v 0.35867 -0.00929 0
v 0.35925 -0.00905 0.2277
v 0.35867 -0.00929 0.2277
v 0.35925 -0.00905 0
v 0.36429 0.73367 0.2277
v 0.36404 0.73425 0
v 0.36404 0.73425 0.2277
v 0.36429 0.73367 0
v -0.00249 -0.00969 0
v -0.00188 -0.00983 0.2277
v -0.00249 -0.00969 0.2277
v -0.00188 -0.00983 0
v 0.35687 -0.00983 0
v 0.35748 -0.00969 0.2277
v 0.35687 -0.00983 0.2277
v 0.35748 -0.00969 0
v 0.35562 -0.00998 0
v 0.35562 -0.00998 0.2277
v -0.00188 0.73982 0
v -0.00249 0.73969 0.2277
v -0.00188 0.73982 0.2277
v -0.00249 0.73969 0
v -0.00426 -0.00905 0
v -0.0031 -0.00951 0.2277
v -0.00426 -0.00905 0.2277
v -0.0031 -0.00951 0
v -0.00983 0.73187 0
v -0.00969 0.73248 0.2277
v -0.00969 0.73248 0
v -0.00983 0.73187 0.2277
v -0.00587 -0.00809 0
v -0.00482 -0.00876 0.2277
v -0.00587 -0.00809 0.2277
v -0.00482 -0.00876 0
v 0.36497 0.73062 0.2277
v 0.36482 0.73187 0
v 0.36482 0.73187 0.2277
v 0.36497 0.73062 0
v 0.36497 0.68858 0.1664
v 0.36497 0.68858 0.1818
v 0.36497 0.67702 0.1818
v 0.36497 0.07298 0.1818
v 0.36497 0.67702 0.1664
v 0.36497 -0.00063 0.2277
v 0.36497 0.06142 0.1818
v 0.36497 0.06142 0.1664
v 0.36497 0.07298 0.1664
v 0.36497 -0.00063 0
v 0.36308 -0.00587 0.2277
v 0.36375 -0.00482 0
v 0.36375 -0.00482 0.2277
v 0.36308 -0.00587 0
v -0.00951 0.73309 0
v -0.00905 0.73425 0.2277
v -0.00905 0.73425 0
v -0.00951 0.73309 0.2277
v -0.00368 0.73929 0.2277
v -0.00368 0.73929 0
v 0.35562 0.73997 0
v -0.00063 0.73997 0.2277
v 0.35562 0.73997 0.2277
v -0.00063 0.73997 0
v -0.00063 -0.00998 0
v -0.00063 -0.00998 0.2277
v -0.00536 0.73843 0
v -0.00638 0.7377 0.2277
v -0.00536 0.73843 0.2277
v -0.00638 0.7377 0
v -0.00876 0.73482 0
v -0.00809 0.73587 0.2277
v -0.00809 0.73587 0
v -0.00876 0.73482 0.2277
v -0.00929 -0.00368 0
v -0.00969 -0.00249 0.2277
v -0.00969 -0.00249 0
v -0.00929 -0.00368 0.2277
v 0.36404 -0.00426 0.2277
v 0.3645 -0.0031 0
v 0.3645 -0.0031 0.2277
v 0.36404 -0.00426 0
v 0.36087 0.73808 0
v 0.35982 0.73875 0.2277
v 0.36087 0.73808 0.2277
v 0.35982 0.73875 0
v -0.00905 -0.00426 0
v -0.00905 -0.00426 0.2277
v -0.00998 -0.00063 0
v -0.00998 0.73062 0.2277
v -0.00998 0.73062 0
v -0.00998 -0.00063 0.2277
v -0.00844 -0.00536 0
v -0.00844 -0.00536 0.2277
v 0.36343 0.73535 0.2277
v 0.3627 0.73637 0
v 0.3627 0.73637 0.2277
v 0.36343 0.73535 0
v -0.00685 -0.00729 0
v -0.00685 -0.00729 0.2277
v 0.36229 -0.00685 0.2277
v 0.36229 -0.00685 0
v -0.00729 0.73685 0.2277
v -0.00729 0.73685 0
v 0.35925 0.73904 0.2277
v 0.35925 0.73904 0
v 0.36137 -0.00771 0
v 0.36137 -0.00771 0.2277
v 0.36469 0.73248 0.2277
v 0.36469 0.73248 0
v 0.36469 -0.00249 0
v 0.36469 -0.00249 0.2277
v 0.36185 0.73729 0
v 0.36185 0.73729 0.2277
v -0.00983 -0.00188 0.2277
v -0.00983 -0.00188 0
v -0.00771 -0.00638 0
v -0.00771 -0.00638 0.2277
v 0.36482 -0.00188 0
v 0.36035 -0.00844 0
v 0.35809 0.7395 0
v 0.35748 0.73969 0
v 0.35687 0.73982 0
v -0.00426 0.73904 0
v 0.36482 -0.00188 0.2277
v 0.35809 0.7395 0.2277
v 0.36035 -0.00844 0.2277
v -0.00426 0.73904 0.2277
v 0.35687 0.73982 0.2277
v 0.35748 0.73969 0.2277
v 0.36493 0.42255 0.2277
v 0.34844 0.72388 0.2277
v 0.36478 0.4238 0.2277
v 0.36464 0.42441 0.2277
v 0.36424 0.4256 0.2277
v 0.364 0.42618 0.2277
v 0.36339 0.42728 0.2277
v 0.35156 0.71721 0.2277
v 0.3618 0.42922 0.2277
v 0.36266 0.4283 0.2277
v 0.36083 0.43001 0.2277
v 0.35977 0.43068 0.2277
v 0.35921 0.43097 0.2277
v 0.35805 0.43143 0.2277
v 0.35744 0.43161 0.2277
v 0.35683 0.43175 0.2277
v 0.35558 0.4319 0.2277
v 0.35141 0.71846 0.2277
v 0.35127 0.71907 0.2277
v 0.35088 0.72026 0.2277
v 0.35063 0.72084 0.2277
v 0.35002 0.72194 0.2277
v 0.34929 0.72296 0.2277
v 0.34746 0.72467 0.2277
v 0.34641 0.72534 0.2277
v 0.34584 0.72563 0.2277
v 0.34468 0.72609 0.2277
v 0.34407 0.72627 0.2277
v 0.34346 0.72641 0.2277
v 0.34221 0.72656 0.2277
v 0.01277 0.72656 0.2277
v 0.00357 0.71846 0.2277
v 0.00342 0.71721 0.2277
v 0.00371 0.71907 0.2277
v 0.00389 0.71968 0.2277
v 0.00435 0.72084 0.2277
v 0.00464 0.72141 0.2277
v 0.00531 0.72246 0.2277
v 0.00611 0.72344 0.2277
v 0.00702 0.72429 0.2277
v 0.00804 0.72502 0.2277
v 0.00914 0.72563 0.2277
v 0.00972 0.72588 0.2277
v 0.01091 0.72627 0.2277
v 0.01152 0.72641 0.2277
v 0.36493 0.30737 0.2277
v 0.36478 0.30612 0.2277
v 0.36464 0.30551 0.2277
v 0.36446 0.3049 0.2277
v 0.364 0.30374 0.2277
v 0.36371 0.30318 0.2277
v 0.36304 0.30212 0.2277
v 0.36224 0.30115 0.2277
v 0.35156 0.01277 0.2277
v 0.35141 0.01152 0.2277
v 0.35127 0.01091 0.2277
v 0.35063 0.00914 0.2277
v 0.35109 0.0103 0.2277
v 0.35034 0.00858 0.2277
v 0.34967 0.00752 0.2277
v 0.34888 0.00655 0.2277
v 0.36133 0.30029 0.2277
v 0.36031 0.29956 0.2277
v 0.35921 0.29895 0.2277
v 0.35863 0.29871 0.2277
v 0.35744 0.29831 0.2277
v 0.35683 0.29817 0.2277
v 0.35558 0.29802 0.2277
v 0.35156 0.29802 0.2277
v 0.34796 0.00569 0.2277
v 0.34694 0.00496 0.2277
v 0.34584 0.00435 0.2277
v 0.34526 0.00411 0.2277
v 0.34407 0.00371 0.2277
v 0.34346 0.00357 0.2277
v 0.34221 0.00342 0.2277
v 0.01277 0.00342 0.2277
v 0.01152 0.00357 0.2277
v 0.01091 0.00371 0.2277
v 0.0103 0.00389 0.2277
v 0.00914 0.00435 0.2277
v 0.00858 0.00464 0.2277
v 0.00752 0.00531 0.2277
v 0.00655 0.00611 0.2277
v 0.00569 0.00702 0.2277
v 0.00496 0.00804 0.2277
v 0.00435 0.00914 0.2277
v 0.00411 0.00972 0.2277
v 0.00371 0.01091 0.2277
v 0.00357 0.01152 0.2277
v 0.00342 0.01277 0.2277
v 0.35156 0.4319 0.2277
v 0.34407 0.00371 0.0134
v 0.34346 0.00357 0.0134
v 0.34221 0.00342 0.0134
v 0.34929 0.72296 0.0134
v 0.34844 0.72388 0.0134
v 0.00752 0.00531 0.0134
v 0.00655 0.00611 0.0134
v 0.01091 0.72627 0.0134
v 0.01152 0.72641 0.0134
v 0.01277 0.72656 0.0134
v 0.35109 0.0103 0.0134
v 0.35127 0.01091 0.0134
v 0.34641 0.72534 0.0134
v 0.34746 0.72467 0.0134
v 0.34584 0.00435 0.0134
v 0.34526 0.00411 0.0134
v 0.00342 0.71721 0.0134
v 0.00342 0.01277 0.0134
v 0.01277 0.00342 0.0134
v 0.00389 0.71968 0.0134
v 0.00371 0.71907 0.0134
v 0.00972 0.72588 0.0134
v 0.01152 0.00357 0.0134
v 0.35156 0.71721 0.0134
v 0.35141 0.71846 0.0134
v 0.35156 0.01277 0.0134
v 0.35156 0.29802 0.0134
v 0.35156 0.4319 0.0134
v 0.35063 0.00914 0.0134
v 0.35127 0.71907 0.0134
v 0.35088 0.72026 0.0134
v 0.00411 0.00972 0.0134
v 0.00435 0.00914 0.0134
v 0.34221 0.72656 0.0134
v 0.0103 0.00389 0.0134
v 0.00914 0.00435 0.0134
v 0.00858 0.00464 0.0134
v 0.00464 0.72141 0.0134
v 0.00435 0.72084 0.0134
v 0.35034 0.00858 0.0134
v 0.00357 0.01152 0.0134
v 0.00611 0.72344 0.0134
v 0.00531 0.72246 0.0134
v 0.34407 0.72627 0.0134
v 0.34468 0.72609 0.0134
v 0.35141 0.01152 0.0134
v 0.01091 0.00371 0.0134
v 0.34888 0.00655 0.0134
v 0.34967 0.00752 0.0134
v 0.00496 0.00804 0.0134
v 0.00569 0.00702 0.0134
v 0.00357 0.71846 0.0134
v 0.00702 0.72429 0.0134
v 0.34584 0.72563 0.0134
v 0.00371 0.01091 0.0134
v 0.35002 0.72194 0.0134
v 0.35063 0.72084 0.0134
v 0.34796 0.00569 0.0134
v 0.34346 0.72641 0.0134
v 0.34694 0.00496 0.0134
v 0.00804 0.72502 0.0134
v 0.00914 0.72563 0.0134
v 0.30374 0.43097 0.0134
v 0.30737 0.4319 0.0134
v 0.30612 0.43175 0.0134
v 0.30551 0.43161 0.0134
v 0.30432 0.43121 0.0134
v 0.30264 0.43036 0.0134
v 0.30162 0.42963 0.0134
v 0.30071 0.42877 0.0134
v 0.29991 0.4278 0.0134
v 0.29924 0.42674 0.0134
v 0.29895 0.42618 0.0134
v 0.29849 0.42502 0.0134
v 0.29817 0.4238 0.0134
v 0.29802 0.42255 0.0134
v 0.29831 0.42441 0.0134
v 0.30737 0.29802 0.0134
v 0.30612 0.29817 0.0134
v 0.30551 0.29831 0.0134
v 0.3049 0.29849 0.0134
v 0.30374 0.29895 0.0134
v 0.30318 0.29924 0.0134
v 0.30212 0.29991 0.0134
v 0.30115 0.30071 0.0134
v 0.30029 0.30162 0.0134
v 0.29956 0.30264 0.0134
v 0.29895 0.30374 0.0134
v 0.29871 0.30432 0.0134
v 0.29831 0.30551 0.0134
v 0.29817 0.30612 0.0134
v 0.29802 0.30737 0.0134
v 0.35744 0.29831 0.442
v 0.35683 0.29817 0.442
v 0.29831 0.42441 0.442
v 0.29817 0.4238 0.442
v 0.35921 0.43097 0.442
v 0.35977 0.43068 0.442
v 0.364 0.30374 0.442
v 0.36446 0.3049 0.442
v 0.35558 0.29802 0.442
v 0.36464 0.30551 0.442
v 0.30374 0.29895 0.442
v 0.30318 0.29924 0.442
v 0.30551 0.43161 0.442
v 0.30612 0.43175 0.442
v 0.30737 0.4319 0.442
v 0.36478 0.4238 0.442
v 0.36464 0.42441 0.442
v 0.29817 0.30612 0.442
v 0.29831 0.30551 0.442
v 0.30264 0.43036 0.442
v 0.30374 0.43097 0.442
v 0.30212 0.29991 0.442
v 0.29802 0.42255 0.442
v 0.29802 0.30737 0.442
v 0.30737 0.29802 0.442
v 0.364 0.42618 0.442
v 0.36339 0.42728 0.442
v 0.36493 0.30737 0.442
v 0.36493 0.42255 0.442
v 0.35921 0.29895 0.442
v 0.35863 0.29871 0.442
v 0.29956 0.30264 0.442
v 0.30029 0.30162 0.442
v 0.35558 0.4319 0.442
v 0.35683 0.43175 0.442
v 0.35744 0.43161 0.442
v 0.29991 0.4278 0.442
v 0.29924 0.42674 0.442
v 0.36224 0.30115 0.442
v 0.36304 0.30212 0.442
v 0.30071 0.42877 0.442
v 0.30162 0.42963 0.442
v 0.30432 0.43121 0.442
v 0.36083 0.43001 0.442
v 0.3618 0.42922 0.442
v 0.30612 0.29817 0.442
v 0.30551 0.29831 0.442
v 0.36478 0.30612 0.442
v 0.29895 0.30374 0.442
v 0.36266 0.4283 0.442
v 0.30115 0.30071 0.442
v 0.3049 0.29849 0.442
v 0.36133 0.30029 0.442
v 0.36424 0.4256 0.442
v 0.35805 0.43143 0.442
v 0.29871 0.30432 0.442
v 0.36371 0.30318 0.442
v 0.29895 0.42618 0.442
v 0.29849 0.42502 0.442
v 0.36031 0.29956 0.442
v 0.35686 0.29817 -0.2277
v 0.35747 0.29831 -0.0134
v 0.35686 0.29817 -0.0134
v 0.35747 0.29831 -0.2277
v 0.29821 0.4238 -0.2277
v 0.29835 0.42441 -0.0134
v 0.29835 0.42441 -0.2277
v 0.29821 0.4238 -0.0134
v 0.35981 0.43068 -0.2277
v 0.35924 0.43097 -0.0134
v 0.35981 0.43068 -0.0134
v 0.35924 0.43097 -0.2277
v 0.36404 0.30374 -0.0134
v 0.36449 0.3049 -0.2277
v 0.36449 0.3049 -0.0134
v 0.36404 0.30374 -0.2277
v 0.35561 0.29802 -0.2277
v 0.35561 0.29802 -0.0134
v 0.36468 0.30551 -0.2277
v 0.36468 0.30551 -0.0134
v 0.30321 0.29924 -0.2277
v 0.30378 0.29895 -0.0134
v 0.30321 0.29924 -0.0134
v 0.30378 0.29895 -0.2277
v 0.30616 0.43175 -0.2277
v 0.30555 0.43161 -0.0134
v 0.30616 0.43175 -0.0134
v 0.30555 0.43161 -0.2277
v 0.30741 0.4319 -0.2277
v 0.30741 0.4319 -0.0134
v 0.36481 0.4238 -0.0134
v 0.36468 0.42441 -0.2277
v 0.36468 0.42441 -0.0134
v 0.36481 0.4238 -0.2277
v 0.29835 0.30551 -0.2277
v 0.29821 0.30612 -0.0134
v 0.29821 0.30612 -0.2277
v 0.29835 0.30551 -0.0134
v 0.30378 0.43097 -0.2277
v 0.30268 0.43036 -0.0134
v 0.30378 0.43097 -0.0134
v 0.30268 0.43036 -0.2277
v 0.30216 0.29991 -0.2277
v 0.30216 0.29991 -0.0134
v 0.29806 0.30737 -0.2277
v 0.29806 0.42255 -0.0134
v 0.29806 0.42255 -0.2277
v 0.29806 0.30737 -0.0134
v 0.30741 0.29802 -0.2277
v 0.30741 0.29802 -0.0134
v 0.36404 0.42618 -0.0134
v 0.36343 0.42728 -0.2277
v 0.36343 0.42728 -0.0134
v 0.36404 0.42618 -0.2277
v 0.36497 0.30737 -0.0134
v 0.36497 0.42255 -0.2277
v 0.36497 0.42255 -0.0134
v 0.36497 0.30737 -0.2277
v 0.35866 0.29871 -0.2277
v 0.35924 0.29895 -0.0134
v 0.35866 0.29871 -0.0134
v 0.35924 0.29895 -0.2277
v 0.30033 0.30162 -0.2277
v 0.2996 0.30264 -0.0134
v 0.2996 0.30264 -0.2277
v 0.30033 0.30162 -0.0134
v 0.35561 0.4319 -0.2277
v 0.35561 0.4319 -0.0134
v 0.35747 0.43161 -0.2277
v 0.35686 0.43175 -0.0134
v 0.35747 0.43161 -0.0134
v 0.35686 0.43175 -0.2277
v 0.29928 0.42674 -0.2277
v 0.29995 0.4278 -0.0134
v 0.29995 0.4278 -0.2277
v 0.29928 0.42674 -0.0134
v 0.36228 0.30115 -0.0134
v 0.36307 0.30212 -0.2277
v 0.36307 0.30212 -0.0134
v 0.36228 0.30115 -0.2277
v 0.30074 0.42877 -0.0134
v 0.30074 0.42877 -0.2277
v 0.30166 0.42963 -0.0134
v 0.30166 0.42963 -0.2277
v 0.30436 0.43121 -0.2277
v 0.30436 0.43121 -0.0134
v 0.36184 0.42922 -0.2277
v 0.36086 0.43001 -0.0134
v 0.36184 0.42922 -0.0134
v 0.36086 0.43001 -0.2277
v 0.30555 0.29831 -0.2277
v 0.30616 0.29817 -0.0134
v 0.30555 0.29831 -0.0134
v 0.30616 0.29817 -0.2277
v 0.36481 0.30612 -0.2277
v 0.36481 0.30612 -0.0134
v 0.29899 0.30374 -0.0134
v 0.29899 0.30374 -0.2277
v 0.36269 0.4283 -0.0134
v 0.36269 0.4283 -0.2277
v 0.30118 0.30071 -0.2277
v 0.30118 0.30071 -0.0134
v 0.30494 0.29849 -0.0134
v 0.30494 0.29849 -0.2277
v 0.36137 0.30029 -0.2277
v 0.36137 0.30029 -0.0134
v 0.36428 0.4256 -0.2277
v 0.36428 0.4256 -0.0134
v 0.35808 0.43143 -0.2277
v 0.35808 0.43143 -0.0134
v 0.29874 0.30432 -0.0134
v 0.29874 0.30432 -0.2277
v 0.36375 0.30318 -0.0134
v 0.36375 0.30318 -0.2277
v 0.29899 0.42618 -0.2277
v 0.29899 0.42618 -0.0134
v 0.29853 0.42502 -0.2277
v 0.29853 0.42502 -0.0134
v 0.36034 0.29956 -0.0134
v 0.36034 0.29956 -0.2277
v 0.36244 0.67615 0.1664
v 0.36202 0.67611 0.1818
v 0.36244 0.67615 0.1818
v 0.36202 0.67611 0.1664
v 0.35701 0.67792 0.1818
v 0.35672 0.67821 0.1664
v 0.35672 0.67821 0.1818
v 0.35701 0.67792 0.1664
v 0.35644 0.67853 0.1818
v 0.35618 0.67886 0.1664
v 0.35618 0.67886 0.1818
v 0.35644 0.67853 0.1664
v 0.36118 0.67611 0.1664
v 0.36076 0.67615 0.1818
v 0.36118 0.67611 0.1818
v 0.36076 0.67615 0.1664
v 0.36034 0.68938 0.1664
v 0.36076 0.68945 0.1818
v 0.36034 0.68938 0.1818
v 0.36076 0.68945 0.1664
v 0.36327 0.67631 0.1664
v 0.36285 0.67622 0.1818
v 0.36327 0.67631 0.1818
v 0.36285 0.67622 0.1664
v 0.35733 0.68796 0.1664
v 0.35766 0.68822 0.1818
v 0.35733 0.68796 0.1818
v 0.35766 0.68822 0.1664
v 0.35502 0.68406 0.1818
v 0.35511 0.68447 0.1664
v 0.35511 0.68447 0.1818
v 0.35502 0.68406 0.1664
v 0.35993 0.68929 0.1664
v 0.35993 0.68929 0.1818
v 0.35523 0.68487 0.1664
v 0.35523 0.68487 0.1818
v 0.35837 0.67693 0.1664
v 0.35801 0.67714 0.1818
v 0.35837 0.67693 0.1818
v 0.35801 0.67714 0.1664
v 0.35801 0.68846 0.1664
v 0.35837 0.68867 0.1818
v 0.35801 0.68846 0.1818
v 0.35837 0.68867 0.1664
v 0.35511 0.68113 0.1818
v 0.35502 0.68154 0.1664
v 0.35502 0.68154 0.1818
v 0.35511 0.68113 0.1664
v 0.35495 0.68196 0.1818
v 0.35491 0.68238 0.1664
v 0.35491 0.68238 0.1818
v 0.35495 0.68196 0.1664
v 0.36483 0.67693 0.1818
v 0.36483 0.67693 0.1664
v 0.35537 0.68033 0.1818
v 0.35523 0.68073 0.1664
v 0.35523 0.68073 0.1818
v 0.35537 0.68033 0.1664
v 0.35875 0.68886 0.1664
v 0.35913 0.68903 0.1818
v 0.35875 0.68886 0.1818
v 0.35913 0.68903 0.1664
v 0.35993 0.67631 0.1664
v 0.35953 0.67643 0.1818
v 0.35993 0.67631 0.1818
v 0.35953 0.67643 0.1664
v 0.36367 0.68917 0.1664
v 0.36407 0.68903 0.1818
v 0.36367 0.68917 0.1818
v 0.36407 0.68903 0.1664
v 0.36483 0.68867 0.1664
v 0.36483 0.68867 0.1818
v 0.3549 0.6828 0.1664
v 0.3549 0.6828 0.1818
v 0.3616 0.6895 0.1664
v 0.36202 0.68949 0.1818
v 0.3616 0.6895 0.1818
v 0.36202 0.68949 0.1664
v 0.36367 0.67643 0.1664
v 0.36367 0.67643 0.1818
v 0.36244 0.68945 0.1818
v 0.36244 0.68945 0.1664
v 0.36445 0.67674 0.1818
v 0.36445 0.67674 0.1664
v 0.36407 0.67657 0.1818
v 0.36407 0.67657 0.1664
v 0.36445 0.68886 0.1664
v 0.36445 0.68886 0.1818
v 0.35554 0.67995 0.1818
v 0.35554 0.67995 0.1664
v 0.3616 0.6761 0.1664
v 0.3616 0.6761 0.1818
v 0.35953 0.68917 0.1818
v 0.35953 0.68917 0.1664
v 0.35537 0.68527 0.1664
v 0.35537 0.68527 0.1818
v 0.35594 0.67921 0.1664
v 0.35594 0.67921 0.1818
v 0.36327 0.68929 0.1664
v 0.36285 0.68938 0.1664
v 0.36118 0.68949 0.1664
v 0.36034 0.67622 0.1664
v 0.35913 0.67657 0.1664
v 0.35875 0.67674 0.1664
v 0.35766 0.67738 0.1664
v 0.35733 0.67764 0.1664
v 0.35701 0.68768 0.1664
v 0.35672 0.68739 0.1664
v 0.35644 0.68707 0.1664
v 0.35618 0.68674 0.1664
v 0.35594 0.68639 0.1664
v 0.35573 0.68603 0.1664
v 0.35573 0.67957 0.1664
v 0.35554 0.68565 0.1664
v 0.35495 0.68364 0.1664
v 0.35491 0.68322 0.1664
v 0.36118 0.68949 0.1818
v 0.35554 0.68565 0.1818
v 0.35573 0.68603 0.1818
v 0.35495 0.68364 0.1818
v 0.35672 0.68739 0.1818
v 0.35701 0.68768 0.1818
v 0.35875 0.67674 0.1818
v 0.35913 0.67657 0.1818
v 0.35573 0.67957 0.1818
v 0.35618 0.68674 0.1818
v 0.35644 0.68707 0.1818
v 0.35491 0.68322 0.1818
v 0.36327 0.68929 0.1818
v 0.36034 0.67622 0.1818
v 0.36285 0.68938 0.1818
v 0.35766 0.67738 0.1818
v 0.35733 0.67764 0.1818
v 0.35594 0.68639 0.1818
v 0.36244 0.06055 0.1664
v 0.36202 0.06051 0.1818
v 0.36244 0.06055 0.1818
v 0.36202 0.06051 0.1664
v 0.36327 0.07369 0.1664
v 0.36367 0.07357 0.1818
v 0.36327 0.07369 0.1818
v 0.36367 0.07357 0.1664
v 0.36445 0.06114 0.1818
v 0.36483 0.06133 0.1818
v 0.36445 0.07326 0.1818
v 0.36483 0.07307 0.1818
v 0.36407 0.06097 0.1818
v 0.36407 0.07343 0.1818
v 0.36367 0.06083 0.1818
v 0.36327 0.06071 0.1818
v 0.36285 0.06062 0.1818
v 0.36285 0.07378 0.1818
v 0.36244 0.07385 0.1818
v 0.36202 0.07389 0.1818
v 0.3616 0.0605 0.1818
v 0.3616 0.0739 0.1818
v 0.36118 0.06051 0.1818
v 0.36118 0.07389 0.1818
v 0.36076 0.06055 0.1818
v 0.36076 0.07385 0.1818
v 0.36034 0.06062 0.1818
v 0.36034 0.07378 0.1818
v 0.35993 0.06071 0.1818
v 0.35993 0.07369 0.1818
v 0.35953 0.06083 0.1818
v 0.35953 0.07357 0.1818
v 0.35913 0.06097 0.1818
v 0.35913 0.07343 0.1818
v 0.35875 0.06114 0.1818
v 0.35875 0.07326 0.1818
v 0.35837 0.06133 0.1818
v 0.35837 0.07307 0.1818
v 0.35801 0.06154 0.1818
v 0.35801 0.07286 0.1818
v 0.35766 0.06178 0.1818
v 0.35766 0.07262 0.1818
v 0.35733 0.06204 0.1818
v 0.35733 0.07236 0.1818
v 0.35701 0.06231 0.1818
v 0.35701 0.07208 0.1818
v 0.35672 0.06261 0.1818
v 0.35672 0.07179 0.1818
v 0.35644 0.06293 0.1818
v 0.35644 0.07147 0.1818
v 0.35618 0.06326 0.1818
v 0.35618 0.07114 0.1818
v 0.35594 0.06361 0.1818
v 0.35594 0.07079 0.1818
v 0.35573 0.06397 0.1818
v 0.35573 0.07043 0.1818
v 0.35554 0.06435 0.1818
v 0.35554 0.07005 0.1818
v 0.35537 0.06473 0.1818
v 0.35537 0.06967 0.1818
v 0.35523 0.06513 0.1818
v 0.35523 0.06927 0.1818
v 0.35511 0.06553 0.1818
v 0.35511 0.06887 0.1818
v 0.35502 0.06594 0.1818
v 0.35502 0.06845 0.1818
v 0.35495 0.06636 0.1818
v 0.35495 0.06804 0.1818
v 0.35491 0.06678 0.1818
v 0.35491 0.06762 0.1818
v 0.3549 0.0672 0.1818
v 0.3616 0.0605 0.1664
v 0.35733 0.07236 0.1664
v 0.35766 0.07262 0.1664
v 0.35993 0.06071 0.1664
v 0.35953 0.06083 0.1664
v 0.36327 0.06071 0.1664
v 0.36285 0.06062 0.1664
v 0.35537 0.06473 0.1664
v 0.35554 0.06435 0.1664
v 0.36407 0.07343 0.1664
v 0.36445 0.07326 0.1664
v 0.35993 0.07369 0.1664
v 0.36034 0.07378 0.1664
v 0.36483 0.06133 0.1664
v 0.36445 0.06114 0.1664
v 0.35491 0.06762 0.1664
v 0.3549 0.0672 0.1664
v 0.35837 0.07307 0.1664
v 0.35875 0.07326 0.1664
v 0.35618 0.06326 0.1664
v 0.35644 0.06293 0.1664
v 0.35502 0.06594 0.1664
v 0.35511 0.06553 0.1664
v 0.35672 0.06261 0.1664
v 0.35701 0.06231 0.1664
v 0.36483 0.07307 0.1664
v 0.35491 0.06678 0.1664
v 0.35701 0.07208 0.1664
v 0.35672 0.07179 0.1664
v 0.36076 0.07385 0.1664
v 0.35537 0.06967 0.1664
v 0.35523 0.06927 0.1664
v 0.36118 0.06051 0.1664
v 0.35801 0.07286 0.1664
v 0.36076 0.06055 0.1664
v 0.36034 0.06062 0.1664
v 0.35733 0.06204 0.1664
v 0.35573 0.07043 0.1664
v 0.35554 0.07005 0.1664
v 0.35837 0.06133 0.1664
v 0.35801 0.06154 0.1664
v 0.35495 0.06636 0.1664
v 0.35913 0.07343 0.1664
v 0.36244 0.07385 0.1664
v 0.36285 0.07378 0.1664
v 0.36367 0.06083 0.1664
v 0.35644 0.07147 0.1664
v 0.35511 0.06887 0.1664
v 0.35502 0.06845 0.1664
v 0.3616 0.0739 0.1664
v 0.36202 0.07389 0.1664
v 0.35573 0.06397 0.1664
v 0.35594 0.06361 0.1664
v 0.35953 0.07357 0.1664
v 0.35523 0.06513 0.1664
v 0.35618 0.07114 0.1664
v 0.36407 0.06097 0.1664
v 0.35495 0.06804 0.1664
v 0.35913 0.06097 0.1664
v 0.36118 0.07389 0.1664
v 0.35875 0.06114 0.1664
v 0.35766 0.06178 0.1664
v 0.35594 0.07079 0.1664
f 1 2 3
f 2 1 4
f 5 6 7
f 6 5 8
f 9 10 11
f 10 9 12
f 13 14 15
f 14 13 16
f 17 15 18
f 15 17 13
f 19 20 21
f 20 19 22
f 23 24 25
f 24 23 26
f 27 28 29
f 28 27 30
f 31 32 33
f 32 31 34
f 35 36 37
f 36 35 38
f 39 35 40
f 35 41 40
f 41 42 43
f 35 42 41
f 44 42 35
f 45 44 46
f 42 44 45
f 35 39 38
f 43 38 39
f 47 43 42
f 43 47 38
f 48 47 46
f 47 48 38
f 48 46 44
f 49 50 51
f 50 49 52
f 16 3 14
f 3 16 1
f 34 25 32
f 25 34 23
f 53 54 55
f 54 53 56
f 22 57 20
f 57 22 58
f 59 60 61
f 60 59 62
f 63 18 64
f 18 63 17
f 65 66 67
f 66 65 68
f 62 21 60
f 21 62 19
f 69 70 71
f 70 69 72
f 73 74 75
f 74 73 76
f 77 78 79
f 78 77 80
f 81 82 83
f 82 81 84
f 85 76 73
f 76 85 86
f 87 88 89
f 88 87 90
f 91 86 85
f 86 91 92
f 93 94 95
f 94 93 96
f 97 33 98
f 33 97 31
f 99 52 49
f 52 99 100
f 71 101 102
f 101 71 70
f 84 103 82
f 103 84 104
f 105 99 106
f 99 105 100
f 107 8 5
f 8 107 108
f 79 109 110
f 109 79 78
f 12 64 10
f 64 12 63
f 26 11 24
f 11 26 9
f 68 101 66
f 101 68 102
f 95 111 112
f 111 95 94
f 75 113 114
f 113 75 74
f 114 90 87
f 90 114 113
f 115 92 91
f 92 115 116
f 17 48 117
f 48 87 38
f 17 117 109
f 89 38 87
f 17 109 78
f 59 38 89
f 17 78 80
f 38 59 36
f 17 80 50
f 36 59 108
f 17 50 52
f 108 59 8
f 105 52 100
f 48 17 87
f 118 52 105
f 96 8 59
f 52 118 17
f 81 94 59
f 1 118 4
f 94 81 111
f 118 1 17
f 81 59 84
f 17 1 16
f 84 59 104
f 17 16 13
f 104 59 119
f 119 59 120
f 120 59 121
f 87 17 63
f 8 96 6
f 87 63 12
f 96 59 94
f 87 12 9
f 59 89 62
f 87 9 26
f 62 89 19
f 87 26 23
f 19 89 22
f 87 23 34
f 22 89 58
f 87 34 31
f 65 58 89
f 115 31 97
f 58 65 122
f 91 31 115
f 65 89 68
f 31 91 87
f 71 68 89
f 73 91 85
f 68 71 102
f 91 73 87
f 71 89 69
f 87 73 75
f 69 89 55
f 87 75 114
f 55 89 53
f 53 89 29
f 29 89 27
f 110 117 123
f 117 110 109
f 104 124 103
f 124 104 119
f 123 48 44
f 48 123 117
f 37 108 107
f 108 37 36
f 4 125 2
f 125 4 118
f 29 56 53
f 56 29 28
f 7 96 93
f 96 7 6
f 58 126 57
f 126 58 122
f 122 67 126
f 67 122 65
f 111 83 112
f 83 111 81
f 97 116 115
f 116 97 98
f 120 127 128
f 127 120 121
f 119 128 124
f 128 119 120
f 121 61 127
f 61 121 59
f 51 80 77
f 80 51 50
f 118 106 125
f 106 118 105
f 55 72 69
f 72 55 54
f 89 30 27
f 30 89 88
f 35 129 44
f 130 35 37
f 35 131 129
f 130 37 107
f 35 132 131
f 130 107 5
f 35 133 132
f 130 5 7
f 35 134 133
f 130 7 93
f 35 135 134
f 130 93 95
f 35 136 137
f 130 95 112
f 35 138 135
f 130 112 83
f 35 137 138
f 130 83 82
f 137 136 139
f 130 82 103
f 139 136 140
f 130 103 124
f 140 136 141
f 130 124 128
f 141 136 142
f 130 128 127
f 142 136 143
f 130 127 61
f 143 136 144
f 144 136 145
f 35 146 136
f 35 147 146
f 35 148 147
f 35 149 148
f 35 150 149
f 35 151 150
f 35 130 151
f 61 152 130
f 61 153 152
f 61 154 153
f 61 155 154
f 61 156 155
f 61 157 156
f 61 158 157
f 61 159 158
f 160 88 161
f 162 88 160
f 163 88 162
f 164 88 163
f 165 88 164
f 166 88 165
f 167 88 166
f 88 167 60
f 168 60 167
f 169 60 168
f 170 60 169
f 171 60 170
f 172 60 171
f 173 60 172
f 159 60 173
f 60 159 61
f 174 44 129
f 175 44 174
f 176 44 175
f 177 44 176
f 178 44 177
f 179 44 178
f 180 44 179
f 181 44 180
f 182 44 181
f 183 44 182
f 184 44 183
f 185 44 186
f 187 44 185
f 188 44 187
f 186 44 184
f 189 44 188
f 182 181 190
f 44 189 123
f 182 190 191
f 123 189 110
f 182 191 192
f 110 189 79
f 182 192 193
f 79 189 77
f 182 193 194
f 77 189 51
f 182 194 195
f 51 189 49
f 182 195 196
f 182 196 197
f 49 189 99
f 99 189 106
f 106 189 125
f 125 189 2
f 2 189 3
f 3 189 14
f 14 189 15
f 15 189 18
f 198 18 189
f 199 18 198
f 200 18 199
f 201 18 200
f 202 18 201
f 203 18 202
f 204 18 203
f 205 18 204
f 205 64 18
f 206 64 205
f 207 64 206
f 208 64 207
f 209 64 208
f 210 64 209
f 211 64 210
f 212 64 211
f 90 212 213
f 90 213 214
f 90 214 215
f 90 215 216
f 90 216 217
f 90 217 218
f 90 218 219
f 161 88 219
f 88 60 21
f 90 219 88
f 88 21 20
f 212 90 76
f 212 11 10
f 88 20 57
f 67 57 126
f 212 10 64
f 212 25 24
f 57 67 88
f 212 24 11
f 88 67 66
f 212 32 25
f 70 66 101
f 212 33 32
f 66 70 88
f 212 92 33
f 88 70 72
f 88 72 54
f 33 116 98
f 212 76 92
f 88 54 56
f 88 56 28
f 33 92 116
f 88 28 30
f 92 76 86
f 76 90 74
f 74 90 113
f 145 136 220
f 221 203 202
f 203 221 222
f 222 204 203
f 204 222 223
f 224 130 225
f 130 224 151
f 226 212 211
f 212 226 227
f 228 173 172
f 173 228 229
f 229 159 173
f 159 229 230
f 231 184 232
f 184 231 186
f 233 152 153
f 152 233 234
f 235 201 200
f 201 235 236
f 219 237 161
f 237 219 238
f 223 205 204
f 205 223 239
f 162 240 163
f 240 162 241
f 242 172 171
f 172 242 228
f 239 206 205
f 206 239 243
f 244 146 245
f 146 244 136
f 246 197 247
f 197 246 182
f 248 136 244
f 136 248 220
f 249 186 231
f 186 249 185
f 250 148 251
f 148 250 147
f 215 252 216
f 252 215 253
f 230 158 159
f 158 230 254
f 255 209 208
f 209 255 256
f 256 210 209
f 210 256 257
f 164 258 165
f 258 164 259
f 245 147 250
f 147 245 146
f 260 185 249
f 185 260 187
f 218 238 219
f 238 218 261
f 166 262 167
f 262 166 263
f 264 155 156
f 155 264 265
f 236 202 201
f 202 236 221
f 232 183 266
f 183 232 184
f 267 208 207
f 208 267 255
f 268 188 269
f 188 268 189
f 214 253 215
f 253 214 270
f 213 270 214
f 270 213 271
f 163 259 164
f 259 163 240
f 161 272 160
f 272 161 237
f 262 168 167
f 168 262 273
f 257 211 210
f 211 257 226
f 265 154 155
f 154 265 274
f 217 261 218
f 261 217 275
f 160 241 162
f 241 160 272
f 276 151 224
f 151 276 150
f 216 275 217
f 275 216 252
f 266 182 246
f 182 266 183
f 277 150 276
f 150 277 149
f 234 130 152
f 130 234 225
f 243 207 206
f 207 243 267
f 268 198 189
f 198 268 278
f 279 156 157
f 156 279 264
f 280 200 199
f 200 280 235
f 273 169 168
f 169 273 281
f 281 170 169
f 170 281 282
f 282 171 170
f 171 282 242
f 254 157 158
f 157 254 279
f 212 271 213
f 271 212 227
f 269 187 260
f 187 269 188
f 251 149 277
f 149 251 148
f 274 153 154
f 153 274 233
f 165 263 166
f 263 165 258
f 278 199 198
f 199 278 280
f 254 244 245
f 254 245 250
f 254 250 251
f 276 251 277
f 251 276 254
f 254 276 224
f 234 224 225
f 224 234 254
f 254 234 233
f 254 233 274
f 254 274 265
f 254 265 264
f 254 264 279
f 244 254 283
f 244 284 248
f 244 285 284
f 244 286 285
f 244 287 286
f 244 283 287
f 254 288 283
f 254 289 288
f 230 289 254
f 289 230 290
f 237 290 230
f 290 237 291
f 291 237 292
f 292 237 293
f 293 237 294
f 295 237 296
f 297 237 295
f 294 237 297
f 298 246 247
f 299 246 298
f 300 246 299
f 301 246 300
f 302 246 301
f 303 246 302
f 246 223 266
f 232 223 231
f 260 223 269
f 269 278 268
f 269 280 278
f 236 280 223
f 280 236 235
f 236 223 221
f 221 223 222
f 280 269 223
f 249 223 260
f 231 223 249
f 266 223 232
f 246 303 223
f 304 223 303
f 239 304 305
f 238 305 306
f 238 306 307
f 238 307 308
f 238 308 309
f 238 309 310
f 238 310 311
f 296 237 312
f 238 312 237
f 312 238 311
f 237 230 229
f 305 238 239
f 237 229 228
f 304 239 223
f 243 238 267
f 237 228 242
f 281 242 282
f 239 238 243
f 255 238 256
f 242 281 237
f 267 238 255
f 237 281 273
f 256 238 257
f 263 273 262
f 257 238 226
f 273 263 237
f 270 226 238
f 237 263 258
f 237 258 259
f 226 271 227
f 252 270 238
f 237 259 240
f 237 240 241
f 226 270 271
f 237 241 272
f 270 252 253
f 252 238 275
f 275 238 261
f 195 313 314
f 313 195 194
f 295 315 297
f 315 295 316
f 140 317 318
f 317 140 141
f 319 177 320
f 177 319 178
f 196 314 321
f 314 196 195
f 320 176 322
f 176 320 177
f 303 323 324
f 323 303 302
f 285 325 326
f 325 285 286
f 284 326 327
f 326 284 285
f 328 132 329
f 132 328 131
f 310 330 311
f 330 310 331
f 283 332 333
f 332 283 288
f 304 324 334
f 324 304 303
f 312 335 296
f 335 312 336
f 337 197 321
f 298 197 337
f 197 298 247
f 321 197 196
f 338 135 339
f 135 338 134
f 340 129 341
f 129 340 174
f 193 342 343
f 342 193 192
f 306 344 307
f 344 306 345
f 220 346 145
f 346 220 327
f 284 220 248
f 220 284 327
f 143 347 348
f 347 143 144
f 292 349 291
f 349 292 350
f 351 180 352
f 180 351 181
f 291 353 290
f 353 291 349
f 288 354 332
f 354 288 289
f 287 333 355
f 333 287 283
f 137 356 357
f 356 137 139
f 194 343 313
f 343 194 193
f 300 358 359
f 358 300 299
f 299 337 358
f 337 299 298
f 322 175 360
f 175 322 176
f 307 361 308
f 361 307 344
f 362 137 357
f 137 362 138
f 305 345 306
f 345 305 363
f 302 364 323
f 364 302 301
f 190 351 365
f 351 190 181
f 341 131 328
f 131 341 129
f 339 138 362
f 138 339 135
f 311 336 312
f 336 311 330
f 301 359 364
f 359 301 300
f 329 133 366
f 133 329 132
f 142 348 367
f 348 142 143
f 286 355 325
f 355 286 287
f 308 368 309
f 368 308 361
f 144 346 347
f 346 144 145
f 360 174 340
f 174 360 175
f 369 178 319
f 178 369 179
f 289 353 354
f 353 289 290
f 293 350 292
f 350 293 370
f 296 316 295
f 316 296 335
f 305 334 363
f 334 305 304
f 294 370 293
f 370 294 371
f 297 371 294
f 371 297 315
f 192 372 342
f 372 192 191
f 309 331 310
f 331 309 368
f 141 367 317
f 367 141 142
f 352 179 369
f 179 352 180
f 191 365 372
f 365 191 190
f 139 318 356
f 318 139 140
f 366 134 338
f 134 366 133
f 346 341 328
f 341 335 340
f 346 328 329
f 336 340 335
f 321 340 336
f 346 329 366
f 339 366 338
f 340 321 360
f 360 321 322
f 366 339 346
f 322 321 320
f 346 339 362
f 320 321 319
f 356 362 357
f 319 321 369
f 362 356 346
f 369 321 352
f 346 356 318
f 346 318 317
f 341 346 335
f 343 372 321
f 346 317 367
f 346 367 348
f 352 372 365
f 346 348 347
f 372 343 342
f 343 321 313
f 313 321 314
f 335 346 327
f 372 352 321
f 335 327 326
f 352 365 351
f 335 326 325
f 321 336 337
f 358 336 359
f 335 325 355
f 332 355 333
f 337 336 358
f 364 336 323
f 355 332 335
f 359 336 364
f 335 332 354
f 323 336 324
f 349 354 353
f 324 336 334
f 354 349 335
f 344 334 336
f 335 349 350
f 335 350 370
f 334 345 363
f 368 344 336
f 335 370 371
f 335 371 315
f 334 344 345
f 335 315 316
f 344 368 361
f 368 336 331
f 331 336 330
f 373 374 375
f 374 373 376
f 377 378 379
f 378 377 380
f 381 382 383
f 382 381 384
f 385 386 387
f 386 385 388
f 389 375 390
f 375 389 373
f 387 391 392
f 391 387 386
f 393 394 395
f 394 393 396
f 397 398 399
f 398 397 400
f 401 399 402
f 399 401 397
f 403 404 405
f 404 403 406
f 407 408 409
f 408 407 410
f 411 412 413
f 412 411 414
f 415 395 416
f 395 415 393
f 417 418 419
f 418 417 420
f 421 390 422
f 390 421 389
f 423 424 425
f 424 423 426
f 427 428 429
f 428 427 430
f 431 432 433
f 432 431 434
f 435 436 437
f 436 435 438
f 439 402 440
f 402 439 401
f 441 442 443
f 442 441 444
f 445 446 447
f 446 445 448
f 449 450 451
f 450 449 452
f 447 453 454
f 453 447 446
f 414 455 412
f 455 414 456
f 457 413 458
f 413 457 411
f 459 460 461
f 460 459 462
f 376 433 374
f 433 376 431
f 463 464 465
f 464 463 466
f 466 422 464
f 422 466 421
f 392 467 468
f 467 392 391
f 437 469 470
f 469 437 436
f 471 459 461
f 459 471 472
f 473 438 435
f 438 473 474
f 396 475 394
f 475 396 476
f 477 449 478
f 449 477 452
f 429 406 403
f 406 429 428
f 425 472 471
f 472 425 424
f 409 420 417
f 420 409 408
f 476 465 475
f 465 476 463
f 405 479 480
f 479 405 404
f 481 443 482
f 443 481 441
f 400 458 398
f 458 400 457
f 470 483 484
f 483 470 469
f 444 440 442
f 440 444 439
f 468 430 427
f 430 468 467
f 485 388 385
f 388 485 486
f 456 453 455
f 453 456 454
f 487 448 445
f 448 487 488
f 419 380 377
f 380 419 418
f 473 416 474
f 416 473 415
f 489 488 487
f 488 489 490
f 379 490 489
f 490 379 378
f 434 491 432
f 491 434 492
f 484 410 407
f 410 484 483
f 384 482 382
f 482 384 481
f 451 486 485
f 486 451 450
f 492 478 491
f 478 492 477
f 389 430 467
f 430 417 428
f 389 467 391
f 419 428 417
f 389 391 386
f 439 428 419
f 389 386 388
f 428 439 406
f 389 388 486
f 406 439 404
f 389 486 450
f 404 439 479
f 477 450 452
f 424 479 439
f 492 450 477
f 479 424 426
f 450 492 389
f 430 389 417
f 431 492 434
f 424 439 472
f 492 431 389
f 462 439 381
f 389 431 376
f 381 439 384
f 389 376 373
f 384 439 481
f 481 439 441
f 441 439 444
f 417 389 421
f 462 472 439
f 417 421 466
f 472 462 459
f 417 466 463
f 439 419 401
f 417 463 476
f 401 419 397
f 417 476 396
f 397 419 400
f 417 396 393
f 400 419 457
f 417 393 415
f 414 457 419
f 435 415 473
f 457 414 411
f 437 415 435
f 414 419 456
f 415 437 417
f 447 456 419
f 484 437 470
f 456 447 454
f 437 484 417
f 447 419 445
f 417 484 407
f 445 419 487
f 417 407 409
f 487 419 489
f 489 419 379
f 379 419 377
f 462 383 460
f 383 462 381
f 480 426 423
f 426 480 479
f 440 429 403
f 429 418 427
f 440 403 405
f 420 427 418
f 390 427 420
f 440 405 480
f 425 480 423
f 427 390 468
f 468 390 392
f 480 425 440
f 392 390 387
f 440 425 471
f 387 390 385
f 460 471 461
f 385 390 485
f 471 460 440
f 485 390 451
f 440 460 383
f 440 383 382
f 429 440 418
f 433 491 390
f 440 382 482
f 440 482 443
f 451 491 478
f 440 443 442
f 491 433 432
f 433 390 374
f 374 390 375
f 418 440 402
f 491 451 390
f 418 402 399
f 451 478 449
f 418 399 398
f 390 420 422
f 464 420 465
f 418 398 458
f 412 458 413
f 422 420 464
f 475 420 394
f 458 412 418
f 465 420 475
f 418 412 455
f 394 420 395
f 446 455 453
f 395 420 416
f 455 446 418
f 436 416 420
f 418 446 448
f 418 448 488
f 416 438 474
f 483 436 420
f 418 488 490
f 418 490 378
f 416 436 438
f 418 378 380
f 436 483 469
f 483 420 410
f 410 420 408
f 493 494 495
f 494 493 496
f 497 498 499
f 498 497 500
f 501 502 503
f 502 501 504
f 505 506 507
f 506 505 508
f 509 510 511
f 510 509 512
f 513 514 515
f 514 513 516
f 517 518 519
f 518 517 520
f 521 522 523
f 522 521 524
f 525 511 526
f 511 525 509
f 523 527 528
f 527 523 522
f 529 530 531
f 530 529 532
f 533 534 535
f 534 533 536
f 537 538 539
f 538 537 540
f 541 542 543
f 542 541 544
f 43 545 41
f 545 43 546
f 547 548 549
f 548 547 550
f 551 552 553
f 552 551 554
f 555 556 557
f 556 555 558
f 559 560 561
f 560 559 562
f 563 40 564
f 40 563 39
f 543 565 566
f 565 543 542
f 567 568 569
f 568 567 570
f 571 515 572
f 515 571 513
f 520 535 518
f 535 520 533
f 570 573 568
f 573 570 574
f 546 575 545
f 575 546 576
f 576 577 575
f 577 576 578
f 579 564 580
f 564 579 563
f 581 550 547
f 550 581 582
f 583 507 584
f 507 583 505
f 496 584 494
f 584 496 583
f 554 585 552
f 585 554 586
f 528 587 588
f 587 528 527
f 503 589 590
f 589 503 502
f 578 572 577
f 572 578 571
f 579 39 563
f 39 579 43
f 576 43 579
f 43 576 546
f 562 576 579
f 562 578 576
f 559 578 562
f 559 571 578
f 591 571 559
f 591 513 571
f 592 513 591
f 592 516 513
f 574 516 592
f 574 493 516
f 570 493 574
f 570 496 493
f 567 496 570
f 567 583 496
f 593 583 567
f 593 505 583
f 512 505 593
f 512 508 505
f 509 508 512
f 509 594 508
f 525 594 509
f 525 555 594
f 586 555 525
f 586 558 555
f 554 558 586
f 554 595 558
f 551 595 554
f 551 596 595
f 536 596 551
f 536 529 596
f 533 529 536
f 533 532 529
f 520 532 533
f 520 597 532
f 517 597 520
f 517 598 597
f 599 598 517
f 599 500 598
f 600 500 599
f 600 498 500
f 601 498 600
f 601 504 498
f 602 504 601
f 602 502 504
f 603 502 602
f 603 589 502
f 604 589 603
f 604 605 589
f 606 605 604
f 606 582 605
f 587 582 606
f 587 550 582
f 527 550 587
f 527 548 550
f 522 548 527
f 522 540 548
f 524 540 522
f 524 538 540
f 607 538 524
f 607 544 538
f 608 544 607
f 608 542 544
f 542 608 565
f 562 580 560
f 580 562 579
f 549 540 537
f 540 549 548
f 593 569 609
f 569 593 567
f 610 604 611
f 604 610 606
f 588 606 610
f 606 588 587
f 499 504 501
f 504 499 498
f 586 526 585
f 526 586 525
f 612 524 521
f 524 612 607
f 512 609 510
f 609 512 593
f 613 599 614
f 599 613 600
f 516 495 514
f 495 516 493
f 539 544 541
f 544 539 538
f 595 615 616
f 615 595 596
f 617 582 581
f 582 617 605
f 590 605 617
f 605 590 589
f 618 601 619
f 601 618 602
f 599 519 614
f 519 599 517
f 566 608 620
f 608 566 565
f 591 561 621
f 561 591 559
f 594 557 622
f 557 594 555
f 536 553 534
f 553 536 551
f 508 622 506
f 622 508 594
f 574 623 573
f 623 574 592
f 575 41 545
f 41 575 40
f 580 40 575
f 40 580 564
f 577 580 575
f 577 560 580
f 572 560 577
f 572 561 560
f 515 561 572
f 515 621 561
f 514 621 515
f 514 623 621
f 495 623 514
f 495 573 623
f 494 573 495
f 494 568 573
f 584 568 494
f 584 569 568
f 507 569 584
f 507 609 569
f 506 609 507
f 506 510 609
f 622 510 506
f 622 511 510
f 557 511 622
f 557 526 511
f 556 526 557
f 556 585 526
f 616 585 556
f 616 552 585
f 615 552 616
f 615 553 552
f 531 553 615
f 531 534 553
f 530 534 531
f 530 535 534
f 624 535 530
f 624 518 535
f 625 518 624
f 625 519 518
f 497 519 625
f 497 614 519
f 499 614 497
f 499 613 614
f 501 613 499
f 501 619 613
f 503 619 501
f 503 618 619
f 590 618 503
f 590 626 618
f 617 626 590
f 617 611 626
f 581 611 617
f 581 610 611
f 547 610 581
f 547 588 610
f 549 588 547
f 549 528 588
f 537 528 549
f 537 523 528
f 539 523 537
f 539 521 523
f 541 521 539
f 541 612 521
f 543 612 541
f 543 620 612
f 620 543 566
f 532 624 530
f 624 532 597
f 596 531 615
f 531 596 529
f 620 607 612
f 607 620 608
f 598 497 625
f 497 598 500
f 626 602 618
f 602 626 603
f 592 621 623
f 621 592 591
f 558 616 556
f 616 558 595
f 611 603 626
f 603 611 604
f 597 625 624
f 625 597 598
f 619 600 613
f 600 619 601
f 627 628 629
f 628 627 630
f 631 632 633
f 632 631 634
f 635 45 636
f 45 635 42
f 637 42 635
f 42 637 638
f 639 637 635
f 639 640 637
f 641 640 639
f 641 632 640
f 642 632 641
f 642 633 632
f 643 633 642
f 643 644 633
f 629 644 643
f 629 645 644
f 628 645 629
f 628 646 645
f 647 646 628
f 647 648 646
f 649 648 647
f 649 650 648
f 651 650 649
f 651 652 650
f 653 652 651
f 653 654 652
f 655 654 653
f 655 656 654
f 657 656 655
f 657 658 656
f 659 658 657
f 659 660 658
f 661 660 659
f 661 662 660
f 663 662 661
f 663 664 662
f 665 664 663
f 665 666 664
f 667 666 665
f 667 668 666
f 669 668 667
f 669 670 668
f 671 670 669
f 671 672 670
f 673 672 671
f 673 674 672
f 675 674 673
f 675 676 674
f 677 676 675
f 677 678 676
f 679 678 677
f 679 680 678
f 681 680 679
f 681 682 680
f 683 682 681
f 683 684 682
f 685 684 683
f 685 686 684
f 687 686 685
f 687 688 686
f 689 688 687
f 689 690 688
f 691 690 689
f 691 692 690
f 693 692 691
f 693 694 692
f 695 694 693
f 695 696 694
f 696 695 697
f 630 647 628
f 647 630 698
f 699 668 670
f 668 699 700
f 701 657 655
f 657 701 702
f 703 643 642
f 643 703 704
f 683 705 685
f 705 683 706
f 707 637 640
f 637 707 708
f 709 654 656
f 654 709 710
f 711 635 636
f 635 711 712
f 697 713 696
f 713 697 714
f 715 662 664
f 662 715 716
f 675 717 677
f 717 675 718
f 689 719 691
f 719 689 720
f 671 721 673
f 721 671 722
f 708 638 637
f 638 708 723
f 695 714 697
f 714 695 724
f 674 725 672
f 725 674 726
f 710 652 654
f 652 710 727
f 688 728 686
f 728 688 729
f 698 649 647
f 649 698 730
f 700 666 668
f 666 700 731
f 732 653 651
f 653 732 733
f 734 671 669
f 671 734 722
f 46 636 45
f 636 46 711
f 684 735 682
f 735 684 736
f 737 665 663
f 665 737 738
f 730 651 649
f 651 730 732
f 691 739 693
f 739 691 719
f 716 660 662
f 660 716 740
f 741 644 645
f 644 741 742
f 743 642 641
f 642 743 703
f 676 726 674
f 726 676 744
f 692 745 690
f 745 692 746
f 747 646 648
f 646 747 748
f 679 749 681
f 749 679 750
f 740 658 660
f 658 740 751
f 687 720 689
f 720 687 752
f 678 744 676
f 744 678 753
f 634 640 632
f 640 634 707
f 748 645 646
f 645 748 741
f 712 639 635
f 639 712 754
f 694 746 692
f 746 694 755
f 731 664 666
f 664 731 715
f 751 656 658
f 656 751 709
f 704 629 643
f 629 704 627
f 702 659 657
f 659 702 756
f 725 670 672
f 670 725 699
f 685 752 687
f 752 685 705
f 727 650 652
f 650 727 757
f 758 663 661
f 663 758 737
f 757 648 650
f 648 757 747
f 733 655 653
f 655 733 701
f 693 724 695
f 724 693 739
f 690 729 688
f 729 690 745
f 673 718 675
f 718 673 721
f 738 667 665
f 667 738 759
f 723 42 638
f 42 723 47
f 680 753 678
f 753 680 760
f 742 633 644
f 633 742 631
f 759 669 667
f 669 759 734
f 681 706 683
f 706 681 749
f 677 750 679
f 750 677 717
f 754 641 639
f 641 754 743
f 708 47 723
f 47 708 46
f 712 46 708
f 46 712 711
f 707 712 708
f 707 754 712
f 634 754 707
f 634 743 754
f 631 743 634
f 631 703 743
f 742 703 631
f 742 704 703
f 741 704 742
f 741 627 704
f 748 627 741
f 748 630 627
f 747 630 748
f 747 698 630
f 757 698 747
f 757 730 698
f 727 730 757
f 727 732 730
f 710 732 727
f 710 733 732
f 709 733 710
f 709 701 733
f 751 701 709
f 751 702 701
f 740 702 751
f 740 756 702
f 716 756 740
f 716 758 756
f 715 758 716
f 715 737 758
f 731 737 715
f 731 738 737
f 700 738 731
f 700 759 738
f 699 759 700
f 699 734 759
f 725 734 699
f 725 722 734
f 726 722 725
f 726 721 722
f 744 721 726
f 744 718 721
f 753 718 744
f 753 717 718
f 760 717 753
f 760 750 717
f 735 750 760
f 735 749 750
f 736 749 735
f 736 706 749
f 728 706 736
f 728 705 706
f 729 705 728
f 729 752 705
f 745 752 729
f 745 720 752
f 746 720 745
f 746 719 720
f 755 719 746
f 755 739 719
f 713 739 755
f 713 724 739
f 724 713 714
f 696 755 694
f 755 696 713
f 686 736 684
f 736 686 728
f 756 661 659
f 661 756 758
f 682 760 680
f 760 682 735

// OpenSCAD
// Parameters
base_length = 0.375;
base_width = 0.75;
base_height = 0.013393;
base_reach = 0.0134;

wall_reach = 0.2277;
wall_thickness = 0.0134;

sleeve_length = 0.066964;
sleeve_width = 0.133929;
sleeve_height = 0.214286;
sleeve_extrusion = 0.2143;
sleeve_total_reach = 0.442;
sleeve_offset_left = 0.308;
sleeve_offset_front = 0.308;
sleeve_offset_back = 0.3081;

lower_depth = 0.2143;
lower_top_below_base = 0.0134;
lower_bottom_below_base = 0.2277;

hole_radius = 0.0067;
hole_x = 0.3616;
hole1_y = 0.6828;
hole2_y = 0.0672;
hole_z_start = 0.1674;
hole_z_end = 0.1808;
hole_cut_depth = 0.0134;

corner_r = 0.01;
$fn = 100;

// Rounded rectangle module
module rounded_rect(l, w, h) {
    linear_extrude(height = h)
        offset(r = corner_r)
            square([l - 2*corner_r, w - 2*corner_r], center = false);
}

// Main assembly
difference() {
    union() {
        // Base plate: 0.375 x 0.75, reach 0.0134 from datum
        color("SteelBlue")
            rounded_rect(base_length, base_width, base_reach);

        // Wall frame: same footprint, reach 0.2277 from datum
        // Curved outline preserved, inner openings real (not capped)
        color("SlateBlue")
            difference() {
                rounded_rect(base_length, base_width, wall_reach);
                translate([wall_thickness, wall_thickness, -0.001])
                    rounded_rect(
                        base_length - 2*wall_thickness,
                        base_width - 2*wall_thickness,
                        wall_reach + 0.002
                    );
            }

        // Raised sleeve/post: solid attached material
        // Position: 0.308 from left, 0.308 from front, 0.3081 from back
        // Right edge shares base right edge (0.308 + 0.066964 ≈ 0.375)
        // Total reach 0.442 from base datum
        color("CornflowerBlue")
            translate([sleeve_offset_left, sleeve_offset_front, 0])
                rounded_rect(sleeve_length, sleeve_width, sleeve_total_reach);

        // Lower continuation: paired beneath sleeve, extends below base
        // Shares right edge at x=0.375
        // Top at z = -0.0134, bottom at z = -0.2277
        color("MediumSlateBlue")
            translate([
                base_length - sleeve_length,
                sleeve_offset_front,
                -(lower_bottom_below_base)
            ])
                rounded_rect(sleeve_length, sleeve_width, lower_depth);
    }

    // Two circular through-holes in wall height band
    // Axis at x=0.3616, y=0.6828 and y=0.0672
    // Height band: 0.1674 to 0.1808 above base underside
    // Cut depth 0.0134 (through wall thickness)
    translate([hole_x, hole1_y, hole_z_start - 0.001])
        cylinder(h = hole_cut_depth + 0.002, r = hole_radius);

    translate([hole_x, hole2_y, hole_z_start - 0.001])
        cylinder(h = hole_cut_depth + 0.002, r = hole_radius);
}
